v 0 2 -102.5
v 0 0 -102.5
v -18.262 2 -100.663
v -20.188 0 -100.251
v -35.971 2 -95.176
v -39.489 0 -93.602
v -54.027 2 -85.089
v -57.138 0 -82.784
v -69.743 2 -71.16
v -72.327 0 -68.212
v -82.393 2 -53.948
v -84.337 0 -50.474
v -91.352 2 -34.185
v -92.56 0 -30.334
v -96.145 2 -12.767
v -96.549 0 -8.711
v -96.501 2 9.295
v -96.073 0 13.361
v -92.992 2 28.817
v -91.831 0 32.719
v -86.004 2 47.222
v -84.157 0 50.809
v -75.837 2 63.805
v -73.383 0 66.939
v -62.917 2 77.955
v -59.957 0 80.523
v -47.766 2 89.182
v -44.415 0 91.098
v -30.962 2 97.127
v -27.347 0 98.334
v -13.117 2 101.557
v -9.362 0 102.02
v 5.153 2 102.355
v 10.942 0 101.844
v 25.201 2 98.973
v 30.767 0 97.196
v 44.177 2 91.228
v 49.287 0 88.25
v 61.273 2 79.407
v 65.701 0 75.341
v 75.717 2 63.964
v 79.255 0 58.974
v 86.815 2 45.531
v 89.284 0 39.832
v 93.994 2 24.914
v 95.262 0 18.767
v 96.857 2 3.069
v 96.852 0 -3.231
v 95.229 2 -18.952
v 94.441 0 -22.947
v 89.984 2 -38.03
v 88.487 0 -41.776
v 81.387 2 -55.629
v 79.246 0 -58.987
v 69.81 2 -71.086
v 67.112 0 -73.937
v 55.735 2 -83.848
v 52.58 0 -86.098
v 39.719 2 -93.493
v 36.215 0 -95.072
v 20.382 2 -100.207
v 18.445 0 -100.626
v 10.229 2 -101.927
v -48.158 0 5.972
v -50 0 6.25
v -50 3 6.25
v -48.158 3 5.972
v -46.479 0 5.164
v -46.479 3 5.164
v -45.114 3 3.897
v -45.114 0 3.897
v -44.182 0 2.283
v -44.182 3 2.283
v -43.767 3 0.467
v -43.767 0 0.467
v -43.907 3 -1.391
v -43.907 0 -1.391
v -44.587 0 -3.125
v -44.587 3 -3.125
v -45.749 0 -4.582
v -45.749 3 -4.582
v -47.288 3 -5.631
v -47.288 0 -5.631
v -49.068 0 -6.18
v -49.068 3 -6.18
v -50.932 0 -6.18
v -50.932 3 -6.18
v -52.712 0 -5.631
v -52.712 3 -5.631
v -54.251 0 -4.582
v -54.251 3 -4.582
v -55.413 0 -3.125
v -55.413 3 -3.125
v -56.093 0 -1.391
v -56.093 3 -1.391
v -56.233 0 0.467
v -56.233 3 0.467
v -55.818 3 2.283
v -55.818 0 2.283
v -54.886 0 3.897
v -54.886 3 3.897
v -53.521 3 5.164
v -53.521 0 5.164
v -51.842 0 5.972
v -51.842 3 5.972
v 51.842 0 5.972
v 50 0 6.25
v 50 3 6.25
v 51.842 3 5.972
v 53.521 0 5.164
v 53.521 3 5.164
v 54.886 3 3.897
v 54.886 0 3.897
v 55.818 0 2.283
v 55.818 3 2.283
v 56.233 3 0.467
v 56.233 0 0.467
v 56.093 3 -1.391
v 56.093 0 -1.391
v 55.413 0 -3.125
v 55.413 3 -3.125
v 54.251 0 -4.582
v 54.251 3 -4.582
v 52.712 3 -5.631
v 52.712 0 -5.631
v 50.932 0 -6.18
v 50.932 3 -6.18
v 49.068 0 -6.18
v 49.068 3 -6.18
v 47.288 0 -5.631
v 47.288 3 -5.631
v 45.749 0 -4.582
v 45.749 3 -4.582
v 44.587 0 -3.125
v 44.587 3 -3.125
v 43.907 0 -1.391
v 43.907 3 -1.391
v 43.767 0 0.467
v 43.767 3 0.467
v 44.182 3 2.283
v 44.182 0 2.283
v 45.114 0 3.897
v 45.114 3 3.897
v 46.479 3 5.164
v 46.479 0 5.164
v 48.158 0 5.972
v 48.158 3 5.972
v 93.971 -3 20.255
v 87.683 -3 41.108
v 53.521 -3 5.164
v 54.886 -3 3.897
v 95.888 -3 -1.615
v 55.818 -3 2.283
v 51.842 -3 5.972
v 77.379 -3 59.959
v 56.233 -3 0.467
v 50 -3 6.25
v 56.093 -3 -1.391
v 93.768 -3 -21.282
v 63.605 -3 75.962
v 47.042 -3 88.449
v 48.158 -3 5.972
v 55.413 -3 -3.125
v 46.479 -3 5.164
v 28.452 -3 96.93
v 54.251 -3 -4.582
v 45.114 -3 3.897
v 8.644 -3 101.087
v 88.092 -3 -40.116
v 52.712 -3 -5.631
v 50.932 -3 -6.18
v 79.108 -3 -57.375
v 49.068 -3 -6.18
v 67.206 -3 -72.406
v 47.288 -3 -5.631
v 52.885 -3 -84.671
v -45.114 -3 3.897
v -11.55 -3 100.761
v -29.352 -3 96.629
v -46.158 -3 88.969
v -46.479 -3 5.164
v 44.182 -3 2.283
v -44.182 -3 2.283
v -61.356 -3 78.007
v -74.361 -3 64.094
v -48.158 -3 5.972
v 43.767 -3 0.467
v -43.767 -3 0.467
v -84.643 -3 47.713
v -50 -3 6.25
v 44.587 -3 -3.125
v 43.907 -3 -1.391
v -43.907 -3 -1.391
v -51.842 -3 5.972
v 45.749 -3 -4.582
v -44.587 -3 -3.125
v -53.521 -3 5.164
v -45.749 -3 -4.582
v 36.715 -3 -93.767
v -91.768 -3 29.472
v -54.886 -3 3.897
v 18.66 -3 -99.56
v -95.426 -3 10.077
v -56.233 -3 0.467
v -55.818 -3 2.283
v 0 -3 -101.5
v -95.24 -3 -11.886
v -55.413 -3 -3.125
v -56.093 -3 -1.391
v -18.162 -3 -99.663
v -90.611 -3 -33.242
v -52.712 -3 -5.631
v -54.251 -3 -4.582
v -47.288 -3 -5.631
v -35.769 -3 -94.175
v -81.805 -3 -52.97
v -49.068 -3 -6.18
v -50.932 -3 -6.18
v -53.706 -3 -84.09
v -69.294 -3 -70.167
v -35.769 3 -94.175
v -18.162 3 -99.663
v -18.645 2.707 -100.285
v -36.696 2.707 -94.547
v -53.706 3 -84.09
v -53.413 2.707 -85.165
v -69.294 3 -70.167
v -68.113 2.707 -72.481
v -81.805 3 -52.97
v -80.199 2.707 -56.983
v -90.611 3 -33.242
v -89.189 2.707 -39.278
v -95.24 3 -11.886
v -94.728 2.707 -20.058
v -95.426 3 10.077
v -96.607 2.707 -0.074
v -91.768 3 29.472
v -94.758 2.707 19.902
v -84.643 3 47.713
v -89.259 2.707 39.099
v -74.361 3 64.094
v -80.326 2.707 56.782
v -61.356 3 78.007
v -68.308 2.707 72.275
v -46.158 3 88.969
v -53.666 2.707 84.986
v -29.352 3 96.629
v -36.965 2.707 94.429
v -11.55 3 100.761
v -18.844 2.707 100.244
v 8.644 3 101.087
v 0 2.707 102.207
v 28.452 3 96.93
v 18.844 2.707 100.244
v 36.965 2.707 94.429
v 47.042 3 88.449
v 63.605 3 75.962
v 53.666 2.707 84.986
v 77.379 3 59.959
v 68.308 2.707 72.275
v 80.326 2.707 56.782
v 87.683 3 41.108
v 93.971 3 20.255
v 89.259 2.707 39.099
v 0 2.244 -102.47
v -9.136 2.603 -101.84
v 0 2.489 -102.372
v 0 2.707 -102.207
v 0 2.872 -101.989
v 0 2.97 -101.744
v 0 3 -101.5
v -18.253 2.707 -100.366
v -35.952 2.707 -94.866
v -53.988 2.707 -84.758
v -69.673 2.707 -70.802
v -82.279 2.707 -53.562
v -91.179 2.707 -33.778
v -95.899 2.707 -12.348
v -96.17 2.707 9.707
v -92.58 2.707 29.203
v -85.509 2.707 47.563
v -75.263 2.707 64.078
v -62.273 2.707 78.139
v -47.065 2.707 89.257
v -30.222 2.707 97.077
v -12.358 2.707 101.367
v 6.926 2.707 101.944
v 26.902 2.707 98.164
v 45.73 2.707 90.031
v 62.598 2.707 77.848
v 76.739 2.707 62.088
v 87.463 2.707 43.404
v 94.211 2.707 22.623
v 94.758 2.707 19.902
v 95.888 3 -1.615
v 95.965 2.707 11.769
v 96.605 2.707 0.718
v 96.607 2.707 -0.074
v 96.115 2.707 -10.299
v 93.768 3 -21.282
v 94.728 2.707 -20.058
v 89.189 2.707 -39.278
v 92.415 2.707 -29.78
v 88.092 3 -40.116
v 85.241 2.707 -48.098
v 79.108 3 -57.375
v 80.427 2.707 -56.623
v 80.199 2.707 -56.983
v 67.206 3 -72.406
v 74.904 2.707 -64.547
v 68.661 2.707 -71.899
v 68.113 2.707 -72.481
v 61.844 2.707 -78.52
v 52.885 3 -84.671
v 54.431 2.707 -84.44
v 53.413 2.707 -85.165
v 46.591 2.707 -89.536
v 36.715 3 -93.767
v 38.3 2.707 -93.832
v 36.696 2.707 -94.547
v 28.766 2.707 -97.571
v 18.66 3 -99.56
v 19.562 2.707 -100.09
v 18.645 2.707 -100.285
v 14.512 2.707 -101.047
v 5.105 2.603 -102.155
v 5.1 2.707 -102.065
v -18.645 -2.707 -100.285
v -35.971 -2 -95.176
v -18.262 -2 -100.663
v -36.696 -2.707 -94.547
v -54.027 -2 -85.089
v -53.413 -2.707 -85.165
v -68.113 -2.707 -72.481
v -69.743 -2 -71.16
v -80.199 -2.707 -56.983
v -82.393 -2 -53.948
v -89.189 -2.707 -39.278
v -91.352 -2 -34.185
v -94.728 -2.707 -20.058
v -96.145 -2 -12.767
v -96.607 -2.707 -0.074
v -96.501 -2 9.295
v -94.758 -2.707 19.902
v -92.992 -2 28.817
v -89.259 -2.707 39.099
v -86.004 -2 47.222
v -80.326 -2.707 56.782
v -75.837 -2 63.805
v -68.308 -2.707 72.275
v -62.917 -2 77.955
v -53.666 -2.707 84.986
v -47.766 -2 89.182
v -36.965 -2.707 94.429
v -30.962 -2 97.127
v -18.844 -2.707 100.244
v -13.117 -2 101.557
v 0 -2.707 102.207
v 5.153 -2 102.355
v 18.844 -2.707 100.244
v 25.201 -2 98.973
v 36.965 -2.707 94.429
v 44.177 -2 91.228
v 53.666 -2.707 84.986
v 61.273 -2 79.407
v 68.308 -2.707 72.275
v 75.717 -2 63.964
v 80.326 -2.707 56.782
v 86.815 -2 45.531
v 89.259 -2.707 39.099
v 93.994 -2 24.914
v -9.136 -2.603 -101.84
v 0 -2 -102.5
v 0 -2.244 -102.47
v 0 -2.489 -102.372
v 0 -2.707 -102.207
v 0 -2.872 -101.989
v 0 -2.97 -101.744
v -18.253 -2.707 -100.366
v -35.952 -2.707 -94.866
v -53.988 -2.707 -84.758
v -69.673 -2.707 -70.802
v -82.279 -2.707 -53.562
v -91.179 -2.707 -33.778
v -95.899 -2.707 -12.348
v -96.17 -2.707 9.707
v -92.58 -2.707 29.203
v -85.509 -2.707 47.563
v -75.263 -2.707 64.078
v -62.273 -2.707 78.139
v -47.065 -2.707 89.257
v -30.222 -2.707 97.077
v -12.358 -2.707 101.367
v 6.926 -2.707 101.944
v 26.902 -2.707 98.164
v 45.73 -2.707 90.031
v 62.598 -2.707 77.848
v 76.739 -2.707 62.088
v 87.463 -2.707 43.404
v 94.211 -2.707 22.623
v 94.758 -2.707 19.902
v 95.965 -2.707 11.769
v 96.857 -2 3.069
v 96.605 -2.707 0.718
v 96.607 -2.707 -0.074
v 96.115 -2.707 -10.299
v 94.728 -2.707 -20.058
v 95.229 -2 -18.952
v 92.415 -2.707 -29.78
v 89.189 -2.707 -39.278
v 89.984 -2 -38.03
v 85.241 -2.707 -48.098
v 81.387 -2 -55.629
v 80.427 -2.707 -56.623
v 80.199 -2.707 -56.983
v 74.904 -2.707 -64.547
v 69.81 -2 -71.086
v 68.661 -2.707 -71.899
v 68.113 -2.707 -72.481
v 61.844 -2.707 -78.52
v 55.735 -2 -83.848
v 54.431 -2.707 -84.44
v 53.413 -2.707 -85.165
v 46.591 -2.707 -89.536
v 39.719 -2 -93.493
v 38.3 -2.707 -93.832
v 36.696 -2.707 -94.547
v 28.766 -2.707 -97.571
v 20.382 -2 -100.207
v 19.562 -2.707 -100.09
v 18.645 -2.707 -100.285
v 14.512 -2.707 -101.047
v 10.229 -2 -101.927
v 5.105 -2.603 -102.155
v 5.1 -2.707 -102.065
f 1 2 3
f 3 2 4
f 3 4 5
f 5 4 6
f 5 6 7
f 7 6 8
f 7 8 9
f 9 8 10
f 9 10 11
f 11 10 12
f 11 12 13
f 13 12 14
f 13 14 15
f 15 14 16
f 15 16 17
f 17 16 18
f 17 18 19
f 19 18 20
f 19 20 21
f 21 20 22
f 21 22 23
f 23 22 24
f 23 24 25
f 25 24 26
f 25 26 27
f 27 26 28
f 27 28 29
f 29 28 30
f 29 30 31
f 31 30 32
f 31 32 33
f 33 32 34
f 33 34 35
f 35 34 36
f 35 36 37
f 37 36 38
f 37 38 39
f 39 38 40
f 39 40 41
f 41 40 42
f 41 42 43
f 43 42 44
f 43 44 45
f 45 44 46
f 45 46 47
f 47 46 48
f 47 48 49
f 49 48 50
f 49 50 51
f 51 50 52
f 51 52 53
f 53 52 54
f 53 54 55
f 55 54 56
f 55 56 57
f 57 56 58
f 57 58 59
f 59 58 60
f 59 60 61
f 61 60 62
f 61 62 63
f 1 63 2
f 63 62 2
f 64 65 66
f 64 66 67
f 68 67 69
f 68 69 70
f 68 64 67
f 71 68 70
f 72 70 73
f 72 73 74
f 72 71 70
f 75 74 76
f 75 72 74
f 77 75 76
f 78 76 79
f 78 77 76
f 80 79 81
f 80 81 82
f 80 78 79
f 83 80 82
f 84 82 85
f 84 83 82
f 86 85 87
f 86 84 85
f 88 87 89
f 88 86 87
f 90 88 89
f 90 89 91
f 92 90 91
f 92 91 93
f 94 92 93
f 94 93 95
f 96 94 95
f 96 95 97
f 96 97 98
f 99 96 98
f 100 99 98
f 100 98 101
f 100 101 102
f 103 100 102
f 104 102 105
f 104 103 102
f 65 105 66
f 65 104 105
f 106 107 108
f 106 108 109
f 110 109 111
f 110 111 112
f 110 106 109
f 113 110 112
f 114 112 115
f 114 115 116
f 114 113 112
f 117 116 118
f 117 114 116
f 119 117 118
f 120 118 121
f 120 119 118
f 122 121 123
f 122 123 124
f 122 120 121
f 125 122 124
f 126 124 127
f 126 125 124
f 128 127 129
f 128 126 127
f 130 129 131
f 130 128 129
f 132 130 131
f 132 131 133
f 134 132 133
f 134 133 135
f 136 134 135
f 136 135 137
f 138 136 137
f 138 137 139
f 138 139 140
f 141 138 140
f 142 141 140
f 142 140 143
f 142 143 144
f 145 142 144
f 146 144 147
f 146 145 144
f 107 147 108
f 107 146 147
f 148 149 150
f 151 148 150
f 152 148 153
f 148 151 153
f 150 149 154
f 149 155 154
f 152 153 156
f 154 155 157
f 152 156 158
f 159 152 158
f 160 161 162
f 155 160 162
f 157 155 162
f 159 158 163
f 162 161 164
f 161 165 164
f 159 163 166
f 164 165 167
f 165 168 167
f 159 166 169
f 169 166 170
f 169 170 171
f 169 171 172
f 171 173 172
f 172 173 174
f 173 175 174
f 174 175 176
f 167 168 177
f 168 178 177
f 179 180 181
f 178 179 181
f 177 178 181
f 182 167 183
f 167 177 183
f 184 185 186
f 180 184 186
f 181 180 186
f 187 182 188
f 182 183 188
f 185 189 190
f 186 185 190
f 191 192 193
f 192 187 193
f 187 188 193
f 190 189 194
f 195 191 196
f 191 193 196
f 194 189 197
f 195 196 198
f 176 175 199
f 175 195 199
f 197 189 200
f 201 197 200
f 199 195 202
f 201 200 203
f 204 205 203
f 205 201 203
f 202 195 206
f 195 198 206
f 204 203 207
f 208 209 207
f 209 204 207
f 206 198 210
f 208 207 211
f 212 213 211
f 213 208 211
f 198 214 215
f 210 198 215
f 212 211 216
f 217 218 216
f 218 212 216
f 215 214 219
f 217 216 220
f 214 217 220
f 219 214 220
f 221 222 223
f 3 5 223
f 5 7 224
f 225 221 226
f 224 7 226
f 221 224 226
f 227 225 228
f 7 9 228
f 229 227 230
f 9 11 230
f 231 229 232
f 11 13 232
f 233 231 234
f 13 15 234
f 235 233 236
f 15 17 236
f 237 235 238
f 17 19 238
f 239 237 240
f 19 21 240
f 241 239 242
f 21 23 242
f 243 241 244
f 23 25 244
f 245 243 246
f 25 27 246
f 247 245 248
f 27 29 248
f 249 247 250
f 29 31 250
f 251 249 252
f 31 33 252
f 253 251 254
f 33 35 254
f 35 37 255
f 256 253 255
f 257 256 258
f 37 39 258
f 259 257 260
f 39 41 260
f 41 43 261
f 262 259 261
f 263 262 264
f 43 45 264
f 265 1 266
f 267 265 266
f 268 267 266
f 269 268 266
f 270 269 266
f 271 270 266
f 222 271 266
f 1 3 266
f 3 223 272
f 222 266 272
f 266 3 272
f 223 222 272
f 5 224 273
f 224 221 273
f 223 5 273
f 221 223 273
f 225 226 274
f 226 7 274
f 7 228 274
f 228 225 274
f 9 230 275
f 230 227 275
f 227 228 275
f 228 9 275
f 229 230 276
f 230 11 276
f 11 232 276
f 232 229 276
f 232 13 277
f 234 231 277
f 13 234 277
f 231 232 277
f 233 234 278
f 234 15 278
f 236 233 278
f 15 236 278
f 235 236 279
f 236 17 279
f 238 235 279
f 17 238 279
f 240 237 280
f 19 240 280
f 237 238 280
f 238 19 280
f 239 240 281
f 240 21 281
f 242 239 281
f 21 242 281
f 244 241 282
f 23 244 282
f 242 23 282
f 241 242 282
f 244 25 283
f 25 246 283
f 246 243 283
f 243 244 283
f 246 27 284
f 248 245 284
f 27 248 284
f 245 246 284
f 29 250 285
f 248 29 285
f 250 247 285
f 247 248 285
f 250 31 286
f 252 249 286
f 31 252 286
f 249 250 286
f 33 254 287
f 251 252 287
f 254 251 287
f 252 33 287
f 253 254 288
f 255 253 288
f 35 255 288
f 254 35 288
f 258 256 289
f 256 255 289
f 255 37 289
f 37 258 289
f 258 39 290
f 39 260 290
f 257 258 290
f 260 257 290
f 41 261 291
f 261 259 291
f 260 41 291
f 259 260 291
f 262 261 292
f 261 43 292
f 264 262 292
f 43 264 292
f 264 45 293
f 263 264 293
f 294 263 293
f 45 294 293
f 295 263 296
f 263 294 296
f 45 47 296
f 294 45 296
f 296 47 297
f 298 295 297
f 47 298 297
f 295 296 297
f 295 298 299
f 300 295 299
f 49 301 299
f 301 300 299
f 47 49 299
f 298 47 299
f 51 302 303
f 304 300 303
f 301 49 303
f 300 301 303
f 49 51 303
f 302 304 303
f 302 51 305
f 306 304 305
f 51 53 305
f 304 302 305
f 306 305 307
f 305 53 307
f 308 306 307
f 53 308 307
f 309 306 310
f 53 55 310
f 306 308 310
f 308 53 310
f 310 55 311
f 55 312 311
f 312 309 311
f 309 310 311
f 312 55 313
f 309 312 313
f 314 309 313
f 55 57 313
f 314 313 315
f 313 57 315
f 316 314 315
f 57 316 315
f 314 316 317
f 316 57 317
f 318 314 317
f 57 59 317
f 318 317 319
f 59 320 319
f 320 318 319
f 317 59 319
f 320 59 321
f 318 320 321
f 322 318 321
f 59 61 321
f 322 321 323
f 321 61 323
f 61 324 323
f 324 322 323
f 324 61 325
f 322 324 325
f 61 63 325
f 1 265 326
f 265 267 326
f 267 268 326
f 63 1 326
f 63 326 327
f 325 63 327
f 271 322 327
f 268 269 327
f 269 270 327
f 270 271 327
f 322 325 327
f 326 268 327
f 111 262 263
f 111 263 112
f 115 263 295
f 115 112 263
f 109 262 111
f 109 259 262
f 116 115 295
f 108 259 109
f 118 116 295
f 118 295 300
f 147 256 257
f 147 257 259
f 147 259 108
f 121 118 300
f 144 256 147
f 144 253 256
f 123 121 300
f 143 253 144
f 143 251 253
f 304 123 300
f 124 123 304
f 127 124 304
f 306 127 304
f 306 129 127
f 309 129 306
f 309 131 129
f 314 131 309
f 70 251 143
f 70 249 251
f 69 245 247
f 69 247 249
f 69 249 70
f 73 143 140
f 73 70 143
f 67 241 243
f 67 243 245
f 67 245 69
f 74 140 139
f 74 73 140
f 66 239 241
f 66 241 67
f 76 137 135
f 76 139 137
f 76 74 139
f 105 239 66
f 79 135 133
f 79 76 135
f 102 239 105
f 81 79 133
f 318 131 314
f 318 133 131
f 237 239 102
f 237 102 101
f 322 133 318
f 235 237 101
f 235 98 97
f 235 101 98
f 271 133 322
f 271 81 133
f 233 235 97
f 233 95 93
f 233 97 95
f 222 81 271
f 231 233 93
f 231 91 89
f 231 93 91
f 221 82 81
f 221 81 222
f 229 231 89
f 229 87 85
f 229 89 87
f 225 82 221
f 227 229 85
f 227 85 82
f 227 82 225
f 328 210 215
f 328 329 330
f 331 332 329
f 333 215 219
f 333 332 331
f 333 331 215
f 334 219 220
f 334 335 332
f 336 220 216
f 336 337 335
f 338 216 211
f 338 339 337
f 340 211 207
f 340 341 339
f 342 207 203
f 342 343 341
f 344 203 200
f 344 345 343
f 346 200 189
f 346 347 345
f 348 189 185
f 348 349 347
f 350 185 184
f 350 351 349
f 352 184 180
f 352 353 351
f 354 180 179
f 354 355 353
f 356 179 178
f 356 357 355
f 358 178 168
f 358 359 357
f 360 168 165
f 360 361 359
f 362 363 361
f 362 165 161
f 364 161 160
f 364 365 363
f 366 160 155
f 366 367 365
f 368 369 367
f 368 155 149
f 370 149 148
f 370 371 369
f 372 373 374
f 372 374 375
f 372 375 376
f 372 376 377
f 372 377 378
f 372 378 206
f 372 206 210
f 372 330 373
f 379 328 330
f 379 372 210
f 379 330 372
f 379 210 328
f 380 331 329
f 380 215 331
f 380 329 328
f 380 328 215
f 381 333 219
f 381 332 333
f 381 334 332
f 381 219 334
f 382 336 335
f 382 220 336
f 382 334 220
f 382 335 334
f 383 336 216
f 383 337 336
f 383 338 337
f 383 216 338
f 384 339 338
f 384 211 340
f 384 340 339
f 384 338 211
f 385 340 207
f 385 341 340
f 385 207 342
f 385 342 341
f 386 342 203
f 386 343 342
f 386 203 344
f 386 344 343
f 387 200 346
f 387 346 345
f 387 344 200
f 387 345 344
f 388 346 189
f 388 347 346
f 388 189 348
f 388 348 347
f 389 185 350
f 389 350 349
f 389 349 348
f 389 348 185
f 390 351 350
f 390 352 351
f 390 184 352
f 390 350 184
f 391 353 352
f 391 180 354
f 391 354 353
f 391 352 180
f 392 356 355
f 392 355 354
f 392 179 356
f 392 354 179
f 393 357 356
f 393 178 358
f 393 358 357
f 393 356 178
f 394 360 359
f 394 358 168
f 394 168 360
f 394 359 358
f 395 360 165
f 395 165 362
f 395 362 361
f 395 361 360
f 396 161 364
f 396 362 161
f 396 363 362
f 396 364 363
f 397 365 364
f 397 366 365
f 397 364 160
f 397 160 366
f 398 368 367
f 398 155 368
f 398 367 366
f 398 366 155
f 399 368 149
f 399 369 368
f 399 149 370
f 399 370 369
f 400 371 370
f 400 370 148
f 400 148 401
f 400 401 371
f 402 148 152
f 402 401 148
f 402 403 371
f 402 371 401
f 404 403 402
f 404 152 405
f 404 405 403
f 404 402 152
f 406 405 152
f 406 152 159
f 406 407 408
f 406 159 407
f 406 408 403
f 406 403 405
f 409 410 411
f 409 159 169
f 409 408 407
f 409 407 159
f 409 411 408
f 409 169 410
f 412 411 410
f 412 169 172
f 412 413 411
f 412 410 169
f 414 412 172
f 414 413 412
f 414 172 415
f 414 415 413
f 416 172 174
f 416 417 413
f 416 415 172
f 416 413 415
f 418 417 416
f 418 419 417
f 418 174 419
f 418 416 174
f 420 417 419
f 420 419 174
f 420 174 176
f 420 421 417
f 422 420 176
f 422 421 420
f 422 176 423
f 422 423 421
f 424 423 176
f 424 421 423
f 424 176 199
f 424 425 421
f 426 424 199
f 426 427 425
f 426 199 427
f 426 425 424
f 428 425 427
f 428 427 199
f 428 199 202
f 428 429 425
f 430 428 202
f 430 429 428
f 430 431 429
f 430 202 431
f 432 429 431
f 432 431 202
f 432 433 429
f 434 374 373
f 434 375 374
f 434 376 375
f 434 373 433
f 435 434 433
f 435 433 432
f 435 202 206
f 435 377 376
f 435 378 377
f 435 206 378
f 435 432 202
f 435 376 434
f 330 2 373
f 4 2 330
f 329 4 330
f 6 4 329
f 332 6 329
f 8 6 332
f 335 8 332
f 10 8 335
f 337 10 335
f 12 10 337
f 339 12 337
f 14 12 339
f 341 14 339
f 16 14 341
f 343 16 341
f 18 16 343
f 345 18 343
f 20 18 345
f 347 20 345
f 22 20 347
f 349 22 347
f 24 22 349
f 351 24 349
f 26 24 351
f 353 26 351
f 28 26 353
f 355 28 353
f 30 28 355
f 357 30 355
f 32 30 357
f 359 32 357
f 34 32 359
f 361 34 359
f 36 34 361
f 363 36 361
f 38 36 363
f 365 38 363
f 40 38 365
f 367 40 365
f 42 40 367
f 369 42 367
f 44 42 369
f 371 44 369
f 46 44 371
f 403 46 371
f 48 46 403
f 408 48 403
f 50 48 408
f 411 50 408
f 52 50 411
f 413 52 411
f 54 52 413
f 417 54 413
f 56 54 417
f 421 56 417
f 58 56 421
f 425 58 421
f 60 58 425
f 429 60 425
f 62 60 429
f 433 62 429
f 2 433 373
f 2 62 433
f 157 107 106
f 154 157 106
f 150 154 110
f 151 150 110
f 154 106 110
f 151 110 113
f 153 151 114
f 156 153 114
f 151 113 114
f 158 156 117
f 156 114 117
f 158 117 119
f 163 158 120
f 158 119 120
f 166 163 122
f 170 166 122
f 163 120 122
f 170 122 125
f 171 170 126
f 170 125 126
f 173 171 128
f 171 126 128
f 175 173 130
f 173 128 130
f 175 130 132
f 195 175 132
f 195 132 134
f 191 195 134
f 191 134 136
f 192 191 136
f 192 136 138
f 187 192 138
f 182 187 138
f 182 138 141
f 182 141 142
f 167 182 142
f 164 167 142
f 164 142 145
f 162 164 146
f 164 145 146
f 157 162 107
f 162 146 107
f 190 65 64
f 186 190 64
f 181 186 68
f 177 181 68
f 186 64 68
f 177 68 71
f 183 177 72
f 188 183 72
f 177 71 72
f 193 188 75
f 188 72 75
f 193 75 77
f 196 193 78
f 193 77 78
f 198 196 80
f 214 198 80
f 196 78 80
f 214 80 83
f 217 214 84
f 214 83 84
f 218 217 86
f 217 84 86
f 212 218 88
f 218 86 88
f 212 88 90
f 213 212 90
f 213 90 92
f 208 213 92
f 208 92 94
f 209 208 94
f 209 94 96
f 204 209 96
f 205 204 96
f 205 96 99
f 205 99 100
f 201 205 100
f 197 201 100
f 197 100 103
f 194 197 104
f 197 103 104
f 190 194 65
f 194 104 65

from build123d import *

# Parameters (mm, degrees)
SKETCH1_RX          = 102.5
SKETCH1_RY          = 96.9
SKETCH1_R           = 6.25
BOSS_EXTRUDE1_DEPTH = 3
FILLET1_R           = 1


with BuildPart() as part:
    # Sketch1 → Boss-Extrude1 (new, symmetric)
    with BuildSketch(Plane(origin=(0, 0, 0), x_dir=(1, 0, 0), z_dir=(0, 1, 0))):
        with Locations(Location((0, 0), (0, 0, 90))):
            Ellipse(SKETCH1_RX, SKETCH1_RY)
        with Locations(Location((-50, 0, 0), (0, 0, 270))):
            Circle(SKETCH1_R, mode=Mode.SUBTRACT)
        with Locations(Location((50, 0, 0), (0, 0, 270))):
            Circle(SKETCH1_R, mode=Mode.SUBTRACT)
    extrude(amount=BOSS_EXTRUDE1_DEPTH, both=True)

    # Fillet1
    fillet1_edges = [part.edges().sort_by_distance(p)[0] for p in [
        (0.000247524, -3, 102.5),
        (0.000247524, 3, 102.5),
    ]]
    fillet(fillet1_edges, radius=FILLET1_R)


solid = part.part
